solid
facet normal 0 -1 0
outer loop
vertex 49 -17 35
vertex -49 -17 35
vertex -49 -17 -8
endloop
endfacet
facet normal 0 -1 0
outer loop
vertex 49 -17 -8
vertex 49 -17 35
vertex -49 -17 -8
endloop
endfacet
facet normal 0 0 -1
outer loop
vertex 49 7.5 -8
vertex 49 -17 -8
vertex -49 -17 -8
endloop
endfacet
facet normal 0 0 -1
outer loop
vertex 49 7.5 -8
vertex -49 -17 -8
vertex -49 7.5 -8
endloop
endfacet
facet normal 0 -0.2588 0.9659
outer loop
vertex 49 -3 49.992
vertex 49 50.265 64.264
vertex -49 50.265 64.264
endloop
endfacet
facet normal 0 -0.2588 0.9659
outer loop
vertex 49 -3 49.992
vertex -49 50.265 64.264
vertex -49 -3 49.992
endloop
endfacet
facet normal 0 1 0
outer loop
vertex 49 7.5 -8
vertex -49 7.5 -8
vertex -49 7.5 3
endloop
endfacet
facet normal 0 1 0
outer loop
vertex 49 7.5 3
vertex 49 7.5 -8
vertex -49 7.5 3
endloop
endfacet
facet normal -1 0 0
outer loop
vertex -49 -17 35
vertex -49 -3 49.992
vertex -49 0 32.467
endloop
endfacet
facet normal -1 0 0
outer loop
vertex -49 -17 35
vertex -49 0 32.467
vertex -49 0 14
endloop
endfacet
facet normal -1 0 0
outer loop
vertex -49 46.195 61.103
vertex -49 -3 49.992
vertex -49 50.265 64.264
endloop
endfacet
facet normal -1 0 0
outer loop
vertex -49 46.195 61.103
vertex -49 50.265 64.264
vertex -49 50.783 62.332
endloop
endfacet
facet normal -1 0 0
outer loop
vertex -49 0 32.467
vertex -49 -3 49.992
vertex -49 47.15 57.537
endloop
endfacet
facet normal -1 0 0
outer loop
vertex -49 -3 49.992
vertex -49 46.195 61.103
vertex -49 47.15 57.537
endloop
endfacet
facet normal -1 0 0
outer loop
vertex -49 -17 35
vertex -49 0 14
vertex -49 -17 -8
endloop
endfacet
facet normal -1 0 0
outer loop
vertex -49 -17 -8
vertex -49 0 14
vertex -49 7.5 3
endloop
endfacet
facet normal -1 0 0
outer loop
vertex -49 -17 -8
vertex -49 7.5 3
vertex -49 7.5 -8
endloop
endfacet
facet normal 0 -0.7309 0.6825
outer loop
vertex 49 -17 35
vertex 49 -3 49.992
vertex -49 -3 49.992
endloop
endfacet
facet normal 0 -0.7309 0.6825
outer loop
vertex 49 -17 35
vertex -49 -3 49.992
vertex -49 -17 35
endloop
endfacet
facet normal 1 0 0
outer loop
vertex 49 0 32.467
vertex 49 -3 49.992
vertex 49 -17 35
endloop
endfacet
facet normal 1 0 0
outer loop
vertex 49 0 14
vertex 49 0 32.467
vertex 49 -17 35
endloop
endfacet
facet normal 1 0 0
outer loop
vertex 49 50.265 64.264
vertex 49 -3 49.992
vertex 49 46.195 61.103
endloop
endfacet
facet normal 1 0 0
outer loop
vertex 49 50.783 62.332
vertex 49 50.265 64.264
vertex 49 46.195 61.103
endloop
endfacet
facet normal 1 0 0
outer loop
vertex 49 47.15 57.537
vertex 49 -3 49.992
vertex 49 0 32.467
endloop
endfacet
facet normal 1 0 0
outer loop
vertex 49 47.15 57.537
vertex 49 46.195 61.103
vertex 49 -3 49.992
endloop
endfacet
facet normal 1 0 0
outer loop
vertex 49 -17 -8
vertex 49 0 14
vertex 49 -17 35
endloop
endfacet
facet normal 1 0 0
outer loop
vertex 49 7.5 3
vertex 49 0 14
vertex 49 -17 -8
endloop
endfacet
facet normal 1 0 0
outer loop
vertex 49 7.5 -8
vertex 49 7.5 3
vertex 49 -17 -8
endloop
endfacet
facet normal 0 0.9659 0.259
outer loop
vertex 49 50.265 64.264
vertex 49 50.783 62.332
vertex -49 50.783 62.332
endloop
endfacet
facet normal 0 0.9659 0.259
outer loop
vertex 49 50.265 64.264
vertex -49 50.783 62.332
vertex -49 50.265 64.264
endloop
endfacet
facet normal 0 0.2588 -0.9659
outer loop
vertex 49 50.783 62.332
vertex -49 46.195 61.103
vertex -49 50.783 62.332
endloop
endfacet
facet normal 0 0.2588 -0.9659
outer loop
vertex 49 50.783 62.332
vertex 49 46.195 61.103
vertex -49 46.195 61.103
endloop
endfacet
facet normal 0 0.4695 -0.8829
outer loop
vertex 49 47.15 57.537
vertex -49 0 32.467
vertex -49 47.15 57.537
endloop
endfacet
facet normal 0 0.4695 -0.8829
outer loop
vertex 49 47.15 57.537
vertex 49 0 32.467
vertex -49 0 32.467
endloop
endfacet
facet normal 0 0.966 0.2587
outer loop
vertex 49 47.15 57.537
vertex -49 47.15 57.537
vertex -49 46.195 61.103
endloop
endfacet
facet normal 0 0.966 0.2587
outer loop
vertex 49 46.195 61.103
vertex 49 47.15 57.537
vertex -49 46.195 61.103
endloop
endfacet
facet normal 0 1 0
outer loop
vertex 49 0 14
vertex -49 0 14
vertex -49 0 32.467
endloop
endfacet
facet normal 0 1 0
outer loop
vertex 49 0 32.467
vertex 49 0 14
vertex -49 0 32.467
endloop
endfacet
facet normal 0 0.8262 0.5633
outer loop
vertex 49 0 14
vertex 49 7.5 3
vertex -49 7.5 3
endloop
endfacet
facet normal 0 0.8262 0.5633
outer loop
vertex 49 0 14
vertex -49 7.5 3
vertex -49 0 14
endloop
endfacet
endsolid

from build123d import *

# Parameters (mm, degrees)
BOSS_EXTRUDE1_DEPTH = 49


with BuildPart() as part:
    # Sketch1 → Boss-Extrude1 (new body, symmetric)
    with BuildSketch(Plane(origin=(0, 0, 0), x_dir=(0, 0, -1), z_dir=(1, 0, 0))):
        Polygon((-61.102982905, 46.194785918), (-62.332373369, 50.782933593), (-64.264225021, 50.265295502), (-49.991832107, -3), (-35, -17), (8, -17), (8, 7.5), (-3, 7.5), (-14, 0), (-32.467253687, 0), (-57.53744343, 47.150169341), align=None)
    extrude(amount=BOSS_EXTRUDE1_DEPTH, both=True)


solid = part.part
